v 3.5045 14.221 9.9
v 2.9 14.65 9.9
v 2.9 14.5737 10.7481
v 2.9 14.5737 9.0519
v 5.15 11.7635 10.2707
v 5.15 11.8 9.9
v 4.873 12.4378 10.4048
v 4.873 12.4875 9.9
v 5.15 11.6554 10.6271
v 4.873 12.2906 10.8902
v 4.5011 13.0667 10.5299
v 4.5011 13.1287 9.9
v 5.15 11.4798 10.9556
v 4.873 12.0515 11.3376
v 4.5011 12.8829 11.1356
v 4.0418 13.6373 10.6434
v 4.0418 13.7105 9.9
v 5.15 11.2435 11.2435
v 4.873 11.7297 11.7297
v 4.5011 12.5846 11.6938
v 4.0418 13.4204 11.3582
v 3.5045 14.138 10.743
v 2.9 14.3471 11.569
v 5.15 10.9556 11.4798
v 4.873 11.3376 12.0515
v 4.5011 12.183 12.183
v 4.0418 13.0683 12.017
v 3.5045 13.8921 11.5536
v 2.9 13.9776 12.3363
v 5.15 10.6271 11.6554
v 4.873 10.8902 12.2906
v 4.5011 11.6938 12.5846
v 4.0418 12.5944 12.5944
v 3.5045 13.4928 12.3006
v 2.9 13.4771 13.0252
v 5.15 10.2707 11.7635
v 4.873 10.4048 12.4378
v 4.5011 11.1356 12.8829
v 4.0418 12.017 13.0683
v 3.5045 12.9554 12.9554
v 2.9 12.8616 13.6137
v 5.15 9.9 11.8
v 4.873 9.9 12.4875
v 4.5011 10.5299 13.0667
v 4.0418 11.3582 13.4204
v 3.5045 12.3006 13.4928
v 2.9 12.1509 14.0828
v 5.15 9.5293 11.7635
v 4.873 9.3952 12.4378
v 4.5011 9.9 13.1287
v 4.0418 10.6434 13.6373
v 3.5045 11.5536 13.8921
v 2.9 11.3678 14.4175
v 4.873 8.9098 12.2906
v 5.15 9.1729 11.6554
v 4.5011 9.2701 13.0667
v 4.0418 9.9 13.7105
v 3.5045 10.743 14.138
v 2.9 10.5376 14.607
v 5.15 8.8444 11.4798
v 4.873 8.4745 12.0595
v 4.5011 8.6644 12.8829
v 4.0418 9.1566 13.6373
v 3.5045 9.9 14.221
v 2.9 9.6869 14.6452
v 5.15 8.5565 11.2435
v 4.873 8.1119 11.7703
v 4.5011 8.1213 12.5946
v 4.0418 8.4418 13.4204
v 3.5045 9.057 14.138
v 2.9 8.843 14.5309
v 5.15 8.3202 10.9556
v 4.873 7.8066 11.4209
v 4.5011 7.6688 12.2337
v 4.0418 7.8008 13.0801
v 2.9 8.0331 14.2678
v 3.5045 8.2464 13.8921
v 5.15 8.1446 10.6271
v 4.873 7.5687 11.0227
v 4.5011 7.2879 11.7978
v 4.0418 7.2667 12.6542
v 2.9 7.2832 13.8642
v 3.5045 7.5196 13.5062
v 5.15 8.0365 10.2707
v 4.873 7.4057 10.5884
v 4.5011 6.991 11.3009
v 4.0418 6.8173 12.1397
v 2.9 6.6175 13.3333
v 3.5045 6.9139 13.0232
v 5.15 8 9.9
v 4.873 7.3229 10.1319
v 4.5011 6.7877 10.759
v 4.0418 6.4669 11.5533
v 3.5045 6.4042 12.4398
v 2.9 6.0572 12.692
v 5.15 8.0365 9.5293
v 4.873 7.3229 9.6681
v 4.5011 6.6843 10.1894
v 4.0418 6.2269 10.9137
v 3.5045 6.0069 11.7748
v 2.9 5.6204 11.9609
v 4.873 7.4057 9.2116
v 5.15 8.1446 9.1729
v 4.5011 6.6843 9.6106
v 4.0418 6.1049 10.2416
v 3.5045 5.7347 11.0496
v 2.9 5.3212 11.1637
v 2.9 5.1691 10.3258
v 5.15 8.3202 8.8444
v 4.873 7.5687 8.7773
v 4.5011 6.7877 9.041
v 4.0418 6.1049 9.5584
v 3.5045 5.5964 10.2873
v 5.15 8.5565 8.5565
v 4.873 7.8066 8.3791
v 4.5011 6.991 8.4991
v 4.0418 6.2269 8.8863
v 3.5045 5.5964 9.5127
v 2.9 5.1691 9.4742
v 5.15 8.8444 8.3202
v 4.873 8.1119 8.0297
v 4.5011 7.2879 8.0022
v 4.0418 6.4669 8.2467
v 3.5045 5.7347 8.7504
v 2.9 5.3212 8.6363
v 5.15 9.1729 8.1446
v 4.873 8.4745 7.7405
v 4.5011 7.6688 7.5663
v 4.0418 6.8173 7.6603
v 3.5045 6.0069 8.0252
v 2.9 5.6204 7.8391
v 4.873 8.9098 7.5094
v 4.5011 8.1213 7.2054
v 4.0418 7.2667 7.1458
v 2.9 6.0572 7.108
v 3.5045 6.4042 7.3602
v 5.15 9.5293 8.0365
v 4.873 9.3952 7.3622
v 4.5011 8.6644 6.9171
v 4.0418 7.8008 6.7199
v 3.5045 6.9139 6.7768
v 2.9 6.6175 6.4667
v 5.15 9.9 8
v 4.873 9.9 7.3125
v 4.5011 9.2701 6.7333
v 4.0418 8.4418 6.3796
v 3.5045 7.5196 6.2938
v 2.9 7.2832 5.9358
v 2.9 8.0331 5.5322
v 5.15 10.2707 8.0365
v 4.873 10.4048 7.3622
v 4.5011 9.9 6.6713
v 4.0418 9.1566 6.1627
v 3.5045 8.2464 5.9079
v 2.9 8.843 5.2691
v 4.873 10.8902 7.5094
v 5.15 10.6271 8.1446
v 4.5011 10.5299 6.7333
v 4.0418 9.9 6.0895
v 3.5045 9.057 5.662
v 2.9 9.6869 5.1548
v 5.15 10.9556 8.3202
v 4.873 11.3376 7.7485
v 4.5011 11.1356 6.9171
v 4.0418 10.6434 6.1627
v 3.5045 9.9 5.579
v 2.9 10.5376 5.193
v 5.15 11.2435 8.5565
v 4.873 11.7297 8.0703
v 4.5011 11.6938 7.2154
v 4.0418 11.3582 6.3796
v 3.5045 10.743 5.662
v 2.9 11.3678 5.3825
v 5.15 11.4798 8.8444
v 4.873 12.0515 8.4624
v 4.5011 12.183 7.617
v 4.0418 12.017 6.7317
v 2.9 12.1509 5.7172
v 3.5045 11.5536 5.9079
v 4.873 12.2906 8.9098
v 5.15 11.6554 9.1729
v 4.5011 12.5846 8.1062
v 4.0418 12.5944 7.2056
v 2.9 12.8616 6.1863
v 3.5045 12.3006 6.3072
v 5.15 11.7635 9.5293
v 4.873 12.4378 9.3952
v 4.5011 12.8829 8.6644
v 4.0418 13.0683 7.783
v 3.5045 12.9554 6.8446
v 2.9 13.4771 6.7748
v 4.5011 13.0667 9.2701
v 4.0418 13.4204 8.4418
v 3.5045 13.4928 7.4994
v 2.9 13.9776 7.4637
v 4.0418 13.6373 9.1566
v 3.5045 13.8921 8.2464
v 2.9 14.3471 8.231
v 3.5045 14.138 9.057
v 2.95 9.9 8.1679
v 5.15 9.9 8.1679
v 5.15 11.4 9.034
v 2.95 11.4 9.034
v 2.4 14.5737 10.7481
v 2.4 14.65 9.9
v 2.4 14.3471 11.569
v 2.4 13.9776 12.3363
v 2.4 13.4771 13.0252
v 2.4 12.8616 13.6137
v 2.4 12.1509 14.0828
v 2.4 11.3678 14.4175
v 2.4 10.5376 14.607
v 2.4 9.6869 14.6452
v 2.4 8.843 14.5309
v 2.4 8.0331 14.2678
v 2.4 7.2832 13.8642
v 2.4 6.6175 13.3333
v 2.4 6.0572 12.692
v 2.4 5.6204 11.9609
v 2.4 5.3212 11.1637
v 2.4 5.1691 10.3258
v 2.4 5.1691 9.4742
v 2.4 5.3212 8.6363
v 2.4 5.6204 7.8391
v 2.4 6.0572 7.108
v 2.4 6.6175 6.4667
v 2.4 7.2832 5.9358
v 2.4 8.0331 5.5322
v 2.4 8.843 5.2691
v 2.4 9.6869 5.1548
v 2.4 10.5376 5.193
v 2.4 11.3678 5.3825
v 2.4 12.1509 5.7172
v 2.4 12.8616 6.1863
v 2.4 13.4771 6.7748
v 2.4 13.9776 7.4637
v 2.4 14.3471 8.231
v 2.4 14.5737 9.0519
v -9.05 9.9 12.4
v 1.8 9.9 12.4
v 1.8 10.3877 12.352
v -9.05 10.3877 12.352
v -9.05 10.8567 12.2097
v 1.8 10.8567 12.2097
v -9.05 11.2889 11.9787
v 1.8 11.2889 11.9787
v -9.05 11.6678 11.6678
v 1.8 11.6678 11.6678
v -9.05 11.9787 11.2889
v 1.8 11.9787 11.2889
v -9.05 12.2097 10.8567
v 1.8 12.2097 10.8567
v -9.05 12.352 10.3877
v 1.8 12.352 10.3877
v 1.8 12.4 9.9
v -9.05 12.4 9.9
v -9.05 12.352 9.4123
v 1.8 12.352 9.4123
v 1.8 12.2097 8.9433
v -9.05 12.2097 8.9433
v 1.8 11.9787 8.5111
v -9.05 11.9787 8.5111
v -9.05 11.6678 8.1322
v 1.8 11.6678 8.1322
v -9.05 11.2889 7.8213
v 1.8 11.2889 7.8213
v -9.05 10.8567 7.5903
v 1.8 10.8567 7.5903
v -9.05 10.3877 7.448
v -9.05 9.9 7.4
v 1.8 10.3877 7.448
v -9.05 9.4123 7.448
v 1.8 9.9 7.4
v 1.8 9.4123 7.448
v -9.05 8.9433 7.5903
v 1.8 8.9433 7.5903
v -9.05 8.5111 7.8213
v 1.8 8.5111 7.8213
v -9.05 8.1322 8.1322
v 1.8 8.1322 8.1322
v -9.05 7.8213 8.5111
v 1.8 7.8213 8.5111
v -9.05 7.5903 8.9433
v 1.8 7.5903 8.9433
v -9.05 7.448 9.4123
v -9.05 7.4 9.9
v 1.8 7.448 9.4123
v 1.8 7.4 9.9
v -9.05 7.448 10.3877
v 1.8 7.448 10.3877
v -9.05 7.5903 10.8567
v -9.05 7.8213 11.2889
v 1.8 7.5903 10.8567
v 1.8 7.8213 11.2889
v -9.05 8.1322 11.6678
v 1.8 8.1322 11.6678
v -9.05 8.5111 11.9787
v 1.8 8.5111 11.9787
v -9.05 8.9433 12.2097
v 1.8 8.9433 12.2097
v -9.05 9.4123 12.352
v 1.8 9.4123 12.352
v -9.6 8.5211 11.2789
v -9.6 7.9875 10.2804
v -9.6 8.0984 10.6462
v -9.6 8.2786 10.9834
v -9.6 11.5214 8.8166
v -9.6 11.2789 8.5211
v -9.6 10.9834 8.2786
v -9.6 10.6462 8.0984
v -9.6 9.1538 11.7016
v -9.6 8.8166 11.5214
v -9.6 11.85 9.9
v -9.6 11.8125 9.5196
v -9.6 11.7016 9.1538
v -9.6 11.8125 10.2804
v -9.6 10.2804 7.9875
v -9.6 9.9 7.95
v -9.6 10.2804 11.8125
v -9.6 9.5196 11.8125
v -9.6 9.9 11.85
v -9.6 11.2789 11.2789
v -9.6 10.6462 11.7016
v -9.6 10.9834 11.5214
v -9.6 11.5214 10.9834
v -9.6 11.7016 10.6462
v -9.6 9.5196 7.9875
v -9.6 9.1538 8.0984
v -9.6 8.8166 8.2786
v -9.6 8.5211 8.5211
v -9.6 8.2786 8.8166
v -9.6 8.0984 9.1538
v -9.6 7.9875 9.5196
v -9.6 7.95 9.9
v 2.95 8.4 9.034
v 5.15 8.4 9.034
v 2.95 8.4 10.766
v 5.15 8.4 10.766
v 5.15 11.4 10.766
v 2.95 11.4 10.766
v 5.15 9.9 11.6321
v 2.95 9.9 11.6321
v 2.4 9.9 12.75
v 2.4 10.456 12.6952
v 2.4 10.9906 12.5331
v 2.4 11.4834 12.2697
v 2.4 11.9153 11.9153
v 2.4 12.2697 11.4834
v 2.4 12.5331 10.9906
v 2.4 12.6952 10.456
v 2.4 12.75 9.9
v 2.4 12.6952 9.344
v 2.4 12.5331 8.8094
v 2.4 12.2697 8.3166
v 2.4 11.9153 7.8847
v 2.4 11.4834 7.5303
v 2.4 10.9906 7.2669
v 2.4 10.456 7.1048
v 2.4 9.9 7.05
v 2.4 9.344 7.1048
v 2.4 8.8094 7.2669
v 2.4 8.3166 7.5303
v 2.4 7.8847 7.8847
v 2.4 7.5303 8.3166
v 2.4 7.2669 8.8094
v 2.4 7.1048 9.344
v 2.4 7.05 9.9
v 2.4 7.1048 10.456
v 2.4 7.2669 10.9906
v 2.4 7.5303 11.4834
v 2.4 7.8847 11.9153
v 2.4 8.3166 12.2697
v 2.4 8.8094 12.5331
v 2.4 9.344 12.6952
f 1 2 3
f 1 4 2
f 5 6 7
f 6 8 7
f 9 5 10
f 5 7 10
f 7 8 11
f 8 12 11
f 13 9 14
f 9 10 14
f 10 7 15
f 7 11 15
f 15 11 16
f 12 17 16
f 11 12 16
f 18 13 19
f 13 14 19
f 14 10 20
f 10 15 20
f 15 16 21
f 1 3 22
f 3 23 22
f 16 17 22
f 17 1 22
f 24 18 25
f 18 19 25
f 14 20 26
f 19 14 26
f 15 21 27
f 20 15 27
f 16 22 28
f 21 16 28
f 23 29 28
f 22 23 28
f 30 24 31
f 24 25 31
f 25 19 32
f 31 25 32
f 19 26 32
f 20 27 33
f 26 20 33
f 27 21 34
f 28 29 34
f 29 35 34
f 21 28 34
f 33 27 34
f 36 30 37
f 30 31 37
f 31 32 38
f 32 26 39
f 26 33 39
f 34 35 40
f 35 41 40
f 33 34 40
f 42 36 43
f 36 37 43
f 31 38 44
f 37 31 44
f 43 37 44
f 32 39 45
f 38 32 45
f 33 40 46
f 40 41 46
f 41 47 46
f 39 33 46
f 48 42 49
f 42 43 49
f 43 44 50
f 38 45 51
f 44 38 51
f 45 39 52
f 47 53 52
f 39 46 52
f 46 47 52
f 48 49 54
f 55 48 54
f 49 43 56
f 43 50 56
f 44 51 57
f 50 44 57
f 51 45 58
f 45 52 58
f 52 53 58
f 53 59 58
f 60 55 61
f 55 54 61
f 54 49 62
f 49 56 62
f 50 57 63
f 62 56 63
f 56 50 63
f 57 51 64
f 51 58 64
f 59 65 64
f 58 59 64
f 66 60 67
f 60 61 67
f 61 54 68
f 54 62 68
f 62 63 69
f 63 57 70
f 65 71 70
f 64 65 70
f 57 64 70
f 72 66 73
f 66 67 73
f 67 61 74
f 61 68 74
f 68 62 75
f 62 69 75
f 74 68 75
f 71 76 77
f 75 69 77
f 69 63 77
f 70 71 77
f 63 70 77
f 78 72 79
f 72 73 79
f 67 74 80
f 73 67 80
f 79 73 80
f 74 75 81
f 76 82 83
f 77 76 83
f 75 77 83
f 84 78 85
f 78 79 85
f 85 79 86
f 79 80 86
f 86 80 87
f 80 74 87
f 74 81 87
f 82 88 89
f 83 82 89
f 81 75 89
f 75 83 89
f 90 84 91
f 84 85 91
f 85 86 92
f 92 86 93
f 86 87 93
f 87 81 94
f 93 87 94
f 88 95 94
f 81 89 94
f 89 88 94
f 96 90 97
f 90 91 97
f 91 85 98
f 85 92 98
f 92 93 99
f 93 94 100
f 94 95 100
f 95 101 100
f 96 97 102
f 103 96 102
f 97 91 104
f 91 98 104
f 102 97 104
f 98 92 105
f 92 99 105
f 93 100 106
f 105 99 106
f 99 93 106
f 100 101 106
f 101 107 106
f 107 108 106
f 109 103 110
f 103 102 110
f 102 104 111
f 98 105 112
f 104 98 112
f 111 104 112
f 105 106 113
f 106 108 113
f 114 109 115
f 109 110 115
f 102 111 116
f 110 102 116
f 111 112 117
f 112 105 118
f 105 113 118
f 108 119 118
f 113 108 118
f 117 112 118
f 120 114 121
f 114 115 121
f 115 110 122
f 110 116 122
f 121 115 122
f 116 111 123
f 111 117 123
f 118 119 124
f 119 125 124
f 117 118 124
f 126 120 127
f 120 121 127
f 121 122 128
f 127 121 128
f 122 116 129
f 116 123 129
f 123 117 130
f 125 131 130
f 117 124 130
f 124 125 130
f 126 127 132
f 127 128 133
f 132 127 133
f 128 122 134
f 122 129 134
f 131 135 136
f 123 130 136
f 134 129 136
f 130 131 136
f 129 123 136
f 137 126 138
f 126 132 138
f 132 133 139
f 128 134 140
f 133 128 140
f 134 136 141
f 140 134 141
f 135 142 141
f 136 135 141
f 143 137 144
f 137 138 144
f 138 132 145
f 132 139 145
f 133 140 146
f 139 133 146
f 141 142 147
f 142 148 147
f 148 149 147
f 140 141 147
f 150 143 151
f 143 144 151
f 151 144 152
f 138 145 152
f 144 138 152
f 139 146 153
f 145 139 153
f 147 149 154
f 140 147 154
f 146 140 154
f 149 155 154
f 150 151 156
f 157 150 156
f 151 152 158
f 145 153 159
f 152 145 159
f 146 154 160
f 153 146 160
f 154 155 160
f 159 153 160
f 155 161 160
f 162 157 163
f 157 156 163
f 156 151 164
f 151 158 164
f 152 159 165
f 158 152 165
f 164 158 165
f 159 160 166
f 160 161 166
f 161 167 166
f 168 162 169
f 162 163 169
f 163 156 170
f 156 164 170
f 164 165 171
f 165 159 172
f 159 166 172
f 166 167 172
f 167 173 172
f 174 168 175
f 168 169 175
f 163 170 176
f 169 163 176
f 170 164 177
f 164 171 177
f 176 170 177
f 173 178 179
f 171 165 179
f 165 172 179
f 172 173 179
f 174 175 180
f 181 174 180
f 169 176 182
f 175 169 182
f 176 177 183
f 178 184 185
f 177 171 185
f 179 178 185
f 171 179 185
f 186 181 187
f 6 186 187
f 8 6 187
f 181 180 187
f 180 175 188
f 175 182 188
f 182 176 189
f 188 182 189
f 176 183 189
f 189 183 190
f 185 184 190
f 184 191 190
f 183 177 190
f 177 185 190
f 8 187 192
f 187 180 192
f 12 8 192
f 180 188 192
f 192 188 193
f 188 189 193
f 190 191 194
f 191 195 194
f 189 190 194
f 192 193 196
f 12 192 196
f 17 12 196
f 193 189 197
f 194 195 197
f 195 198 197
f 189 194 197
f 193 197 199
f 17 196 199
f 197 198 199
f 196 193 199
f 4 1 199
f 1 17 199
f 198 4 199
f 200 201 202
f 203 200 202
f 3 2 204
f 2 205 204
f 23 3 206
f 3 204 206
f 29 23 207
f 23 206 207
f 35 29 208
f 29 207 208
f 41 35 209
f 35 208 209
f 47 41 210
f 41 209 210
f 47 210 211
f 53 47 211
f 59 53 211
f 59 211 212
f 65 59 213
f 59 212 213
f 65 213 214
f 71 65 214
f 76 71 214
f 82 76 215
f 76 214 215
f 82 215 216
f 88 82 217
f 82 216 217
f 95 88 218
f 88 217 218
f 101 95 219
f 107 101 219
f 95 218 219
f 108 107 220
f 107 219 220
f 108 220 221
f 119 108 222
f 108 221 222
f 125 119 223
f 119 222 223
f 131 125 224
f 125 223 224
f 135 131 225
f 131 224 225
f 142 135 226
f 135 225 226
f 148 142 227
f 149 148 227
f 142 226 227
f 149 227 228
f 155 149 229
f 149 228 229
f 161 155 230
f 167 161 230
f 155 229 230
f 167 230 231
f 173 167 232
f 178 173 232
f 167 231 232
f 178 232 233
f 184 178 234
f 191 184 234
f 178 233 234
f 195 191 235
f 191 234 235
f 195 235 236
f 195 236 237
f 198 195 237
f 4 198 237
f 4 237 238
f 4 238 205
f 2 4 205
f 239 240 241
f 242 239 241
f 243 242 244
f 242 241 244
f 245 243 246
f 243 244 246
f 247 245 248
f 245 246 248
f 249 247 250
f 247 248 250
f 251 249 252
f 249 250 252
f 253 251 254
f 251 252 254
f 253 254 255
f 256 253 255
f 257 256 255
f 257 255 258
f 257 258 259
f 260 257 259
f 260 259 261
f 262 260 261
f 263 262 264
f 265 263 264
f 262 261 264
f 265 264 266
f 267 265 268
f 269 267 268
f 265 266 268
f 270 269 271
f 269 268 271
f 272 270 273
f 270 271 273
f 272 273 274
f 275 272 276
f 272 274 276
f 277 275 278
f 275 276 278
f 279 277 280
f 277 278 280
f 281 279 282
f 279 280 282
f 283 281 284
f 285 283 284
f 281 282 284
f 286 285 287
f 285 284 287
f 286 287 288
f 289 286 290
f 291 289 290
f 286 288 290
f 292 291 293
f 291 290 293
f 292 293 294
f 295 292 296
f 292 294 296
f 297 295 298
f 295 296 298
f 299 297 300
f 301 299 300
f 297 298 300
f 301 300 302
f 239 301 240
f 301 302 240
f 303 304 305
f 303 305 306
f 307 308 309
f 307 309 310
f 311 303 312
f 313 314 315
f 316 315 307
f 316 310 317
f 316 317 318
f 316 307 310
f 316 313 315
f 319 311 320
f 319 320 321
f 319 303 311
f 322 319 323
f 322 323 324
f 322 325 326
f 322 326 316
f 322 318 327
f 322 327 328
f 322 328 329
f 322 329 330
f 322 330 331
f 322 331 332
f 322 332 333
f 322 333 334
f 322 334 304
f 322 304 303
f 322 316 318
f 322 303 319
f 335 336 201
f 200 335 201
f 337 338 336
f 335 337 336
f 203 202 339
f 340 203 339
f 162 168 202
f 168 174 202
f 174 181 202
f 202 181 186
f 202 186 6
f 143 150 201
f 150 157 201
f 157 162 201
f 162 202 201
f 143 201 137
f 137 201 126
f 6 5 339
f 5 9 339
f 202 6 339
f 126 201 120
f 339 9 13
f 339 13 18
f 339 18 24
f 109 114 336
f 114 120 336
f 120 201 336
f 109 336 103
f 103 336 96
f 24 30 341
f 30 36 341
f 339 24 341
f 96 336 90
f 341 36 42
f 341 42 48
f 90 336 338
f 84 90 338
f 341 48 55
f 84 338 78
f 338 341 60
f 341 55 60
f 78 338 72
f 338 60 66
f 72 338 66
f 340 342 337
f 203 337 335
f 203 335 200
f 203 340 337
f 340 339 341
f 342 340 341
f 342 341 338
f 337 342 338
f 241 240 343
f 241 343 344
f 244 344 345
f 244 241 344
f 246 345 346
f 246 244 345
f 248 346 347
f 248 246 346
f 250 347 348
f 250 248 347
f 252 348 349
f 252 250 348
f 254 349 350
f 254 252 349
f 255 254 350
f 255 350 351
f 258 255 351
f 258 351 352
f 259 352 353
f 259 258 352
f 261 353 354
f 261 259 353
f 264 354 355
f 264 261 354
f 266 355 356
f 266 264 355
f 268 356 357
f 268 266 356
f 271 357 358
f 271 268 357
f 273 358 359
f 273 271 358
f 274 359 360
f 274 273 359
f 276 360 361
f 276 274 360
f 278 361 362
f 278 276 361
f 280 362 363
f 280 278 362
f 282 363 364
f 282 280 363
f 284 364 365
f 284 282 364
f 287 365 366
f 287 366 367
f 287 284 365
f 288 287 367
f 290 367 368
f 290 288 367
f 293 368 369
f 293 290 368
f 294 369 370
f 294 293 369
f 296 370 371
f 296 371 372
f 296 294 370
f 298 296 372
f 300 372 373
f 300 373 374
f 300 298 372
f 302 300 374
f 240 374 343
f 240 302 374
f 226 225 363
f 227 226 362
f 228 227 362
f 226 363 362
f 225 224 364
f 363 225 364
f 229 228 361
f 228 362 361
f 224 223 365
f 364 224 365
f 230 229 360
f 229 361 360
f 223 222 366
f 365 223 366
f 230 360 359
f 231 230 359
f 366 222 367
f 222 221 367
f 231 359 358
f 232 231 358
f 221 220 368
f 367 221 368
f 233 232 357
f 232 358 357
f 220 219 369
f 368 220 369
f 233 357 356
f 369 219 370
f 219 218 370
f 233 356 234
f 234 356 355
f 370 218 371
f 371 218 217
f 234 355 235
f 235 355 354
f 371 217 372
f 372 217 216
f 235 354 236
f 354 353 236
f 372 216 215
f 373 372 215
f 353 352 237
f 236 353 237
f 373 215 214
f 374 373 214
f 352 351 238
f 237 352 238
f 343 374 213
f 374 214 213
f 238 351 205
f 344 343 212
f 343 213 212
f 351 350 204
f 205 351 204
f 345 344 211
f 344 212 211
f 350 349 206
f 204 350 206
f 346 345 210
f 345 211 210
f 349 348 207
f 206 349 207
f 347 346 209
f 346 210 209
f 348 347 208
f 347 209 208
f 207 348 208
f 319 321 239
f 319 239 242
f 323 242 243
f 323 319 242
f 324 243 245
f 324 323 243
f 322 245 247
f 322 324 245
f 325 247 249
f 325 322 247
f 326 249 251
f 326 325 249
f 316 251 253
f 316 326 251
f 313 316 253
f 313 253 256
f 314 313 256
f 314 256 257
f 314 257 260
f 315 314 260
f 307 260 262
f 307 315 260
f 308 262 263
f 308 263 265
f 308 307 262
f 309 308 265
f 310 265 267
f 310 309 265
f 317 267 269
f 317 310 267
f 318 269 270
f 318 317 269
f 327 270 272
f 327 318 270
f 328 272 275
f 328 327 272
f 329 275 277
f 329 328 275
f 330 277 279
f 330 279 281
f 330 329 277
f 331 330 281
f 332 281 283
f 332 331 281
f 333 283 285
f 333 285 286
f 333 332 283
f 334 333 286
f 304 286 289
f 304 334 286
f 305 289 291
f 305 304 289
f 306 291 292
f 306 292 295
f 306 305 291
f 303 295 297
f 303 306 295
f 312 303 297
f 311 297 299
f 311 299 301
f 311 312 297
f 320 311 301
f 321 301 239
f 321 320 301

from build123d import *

# Parameters (mm, degrees)
SKETCH2_R           = 2.5
BOSS_EXTRUDE1_DEPTH = 12
CUT_EXTRUDE1_DEPTH  = 2.2
CHAMFER1_SIZE       = 0.55
CHAMFER2_SIZE       = 0.35
CHAMFER2_SIZE2      = 0.6


with BuildPart() as part:
    # Sketch1 → Revolve1 (revolve)
    with BuildSketch(Plane.XY.offset(9.9)):
        with BuildLine():
            Line((2.4, 14.65), (2.4, 9.9))
            Line((2.4, 9.9), (5.15, 9.9))
            Line((5.15, 9.9), (5.15, 11.8))
            ThreePointArc((5.15, 11.8), (4.281848259, 13.427774941), (2.899999999, 14.65))
            Line((2.899999999, 14.65), (2.4, 14.65))
        make_face()
    revolve(axis=Axis((2.4, 9.9, 9.9), (1, 0, 0)))

    # Sketch2 → Boss-Extrude1 (add)
    with BuildSketch(Plane.ZY.offset(-2.4)):
        with Locations((9.9, 9.9)):
            Circle(SKETCH2_R)
    extrude(amount=BOSS_EXTRUDE1_DEPTH)

    # Sketch3 → Cut-Extrude1 (cut)
    with BuildSketch(Plane(origin=(5.15, 0, 0), x_dir=(0, 0, -1), z_dir=(1, 0, 0))):
        Polygon((-11.6320508, 9.9), (-10.766025397, 8.400000002), (-9.033974587, 8.400000002), (-8.167949184, 9.9), (-9.033974587, 11.399999998), (-10.766025397, 11.399999998), align=None)
    extrude(amount=-CUT_EXTRUDE1_DEPTH, mode=Mode.SUBTRACT)

    # Chamfer1
    chamfer1_edges = [part.edges().sort_by_distance(p)[0] for p in [
        (-9.6, 9.9, 7.4),
    ]]
    chamfer(chamfer1_edges, length=CHAMFER1_SIZE)

    # Chamfer2
    chamfer2_edges = [part.edges().sort_by_distance(p)[0] for p in [
        (2.4, 9.9, 7.4),
    ]]
    chamfer2_side = [part.faces().sort_by_distance(p)[0] for p in [
        (2.4, 5.284350289, 9.9),
    ]]
    chamfer(chamfer2_edges, length=CHAMFER2_SIZE, length2=CHAMFER2_SIZE2, reference=chamfer2_side[0])


solid = part.part
